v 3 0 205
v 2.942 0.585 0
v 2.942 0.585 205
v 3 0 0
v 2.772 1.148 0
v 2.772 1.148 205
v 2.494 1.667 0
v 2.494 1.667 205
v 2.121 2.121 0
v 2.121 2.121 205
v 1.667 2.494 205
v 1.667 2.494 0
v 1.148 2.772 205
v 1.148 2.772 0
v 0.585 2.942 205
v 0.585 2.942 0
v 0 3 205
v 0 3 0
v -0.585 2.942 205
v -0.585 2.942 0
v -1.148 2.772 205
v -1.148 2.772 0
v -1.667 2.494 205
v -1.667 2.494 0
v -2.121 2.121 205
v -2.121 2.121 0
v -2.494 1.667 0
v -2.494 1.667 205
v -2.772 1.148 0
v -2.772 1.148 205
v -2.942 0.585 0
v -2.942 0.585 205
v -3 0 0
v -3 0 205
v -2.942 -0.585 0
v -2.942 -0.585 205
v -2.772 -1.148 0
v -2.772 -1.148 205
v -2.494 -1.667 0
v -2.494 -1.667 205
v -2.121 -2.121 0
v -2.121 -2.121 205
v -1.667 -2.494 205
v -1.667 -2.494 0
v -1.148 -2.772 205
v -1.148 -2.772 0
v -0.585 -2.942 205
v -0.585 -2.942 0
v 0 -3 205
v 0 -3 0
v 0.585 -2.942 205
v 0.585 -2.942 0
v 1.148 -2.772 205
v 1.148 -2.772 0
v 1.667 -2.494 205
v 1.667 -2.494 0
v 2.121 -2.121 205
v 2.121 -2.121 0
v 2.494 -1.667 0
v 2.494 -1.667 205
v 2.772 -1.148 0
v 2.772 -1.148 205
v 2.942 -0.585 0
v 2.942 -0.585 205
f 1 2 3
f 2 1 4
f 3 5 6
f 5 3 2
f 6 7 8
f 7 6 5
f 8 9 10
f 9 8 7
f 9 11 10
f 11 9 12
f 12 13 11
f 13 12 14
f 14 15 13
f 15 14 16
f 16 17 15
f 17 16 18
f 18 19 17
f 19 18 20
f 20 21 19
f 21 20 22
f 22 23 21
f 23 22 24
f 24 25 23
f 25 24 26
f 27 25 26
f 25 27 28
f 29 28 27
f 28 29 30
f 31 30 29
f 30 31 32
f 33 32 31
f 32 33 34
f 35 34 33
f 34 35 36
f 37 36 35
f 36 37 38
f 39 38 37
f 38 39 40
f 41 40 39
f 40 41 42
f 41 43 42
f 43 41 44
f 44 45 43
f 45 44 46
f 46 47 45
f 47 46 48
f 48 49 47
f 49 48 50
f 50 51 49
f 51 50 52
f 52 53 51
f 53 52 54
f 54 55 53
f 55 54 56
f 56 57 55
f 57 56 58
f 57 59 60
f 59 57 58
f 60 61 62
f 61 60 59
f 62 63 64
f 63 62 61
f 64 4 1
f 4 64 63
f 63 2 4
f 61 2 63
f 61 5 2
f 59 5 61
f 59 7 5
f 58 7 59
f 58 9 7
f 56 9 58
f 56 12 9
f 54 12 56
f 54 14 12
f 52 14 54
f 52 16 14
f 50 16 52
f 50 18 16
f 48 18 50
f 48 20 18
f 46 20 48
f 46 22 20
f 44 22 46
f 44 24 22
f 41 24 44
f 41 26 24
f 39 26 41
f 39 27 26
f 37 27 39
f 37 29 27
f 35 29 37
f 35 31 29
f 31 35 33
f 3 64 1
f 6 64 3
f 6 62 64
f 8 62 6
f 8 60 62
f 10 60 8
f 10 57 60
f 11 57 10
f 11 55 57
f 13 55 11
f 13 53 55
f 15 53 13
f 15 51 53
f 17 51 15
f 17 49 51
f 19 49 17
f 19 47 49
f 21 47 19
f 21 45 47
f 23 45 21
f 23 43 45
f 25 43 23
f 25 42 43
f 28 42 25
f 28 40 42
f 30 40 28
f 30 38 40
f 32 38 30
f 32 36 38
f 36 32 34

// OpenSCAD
// Purchased hardware envelope; no modeled threads, not print.
$fn=32;
cylinder(d=6,h=205);
